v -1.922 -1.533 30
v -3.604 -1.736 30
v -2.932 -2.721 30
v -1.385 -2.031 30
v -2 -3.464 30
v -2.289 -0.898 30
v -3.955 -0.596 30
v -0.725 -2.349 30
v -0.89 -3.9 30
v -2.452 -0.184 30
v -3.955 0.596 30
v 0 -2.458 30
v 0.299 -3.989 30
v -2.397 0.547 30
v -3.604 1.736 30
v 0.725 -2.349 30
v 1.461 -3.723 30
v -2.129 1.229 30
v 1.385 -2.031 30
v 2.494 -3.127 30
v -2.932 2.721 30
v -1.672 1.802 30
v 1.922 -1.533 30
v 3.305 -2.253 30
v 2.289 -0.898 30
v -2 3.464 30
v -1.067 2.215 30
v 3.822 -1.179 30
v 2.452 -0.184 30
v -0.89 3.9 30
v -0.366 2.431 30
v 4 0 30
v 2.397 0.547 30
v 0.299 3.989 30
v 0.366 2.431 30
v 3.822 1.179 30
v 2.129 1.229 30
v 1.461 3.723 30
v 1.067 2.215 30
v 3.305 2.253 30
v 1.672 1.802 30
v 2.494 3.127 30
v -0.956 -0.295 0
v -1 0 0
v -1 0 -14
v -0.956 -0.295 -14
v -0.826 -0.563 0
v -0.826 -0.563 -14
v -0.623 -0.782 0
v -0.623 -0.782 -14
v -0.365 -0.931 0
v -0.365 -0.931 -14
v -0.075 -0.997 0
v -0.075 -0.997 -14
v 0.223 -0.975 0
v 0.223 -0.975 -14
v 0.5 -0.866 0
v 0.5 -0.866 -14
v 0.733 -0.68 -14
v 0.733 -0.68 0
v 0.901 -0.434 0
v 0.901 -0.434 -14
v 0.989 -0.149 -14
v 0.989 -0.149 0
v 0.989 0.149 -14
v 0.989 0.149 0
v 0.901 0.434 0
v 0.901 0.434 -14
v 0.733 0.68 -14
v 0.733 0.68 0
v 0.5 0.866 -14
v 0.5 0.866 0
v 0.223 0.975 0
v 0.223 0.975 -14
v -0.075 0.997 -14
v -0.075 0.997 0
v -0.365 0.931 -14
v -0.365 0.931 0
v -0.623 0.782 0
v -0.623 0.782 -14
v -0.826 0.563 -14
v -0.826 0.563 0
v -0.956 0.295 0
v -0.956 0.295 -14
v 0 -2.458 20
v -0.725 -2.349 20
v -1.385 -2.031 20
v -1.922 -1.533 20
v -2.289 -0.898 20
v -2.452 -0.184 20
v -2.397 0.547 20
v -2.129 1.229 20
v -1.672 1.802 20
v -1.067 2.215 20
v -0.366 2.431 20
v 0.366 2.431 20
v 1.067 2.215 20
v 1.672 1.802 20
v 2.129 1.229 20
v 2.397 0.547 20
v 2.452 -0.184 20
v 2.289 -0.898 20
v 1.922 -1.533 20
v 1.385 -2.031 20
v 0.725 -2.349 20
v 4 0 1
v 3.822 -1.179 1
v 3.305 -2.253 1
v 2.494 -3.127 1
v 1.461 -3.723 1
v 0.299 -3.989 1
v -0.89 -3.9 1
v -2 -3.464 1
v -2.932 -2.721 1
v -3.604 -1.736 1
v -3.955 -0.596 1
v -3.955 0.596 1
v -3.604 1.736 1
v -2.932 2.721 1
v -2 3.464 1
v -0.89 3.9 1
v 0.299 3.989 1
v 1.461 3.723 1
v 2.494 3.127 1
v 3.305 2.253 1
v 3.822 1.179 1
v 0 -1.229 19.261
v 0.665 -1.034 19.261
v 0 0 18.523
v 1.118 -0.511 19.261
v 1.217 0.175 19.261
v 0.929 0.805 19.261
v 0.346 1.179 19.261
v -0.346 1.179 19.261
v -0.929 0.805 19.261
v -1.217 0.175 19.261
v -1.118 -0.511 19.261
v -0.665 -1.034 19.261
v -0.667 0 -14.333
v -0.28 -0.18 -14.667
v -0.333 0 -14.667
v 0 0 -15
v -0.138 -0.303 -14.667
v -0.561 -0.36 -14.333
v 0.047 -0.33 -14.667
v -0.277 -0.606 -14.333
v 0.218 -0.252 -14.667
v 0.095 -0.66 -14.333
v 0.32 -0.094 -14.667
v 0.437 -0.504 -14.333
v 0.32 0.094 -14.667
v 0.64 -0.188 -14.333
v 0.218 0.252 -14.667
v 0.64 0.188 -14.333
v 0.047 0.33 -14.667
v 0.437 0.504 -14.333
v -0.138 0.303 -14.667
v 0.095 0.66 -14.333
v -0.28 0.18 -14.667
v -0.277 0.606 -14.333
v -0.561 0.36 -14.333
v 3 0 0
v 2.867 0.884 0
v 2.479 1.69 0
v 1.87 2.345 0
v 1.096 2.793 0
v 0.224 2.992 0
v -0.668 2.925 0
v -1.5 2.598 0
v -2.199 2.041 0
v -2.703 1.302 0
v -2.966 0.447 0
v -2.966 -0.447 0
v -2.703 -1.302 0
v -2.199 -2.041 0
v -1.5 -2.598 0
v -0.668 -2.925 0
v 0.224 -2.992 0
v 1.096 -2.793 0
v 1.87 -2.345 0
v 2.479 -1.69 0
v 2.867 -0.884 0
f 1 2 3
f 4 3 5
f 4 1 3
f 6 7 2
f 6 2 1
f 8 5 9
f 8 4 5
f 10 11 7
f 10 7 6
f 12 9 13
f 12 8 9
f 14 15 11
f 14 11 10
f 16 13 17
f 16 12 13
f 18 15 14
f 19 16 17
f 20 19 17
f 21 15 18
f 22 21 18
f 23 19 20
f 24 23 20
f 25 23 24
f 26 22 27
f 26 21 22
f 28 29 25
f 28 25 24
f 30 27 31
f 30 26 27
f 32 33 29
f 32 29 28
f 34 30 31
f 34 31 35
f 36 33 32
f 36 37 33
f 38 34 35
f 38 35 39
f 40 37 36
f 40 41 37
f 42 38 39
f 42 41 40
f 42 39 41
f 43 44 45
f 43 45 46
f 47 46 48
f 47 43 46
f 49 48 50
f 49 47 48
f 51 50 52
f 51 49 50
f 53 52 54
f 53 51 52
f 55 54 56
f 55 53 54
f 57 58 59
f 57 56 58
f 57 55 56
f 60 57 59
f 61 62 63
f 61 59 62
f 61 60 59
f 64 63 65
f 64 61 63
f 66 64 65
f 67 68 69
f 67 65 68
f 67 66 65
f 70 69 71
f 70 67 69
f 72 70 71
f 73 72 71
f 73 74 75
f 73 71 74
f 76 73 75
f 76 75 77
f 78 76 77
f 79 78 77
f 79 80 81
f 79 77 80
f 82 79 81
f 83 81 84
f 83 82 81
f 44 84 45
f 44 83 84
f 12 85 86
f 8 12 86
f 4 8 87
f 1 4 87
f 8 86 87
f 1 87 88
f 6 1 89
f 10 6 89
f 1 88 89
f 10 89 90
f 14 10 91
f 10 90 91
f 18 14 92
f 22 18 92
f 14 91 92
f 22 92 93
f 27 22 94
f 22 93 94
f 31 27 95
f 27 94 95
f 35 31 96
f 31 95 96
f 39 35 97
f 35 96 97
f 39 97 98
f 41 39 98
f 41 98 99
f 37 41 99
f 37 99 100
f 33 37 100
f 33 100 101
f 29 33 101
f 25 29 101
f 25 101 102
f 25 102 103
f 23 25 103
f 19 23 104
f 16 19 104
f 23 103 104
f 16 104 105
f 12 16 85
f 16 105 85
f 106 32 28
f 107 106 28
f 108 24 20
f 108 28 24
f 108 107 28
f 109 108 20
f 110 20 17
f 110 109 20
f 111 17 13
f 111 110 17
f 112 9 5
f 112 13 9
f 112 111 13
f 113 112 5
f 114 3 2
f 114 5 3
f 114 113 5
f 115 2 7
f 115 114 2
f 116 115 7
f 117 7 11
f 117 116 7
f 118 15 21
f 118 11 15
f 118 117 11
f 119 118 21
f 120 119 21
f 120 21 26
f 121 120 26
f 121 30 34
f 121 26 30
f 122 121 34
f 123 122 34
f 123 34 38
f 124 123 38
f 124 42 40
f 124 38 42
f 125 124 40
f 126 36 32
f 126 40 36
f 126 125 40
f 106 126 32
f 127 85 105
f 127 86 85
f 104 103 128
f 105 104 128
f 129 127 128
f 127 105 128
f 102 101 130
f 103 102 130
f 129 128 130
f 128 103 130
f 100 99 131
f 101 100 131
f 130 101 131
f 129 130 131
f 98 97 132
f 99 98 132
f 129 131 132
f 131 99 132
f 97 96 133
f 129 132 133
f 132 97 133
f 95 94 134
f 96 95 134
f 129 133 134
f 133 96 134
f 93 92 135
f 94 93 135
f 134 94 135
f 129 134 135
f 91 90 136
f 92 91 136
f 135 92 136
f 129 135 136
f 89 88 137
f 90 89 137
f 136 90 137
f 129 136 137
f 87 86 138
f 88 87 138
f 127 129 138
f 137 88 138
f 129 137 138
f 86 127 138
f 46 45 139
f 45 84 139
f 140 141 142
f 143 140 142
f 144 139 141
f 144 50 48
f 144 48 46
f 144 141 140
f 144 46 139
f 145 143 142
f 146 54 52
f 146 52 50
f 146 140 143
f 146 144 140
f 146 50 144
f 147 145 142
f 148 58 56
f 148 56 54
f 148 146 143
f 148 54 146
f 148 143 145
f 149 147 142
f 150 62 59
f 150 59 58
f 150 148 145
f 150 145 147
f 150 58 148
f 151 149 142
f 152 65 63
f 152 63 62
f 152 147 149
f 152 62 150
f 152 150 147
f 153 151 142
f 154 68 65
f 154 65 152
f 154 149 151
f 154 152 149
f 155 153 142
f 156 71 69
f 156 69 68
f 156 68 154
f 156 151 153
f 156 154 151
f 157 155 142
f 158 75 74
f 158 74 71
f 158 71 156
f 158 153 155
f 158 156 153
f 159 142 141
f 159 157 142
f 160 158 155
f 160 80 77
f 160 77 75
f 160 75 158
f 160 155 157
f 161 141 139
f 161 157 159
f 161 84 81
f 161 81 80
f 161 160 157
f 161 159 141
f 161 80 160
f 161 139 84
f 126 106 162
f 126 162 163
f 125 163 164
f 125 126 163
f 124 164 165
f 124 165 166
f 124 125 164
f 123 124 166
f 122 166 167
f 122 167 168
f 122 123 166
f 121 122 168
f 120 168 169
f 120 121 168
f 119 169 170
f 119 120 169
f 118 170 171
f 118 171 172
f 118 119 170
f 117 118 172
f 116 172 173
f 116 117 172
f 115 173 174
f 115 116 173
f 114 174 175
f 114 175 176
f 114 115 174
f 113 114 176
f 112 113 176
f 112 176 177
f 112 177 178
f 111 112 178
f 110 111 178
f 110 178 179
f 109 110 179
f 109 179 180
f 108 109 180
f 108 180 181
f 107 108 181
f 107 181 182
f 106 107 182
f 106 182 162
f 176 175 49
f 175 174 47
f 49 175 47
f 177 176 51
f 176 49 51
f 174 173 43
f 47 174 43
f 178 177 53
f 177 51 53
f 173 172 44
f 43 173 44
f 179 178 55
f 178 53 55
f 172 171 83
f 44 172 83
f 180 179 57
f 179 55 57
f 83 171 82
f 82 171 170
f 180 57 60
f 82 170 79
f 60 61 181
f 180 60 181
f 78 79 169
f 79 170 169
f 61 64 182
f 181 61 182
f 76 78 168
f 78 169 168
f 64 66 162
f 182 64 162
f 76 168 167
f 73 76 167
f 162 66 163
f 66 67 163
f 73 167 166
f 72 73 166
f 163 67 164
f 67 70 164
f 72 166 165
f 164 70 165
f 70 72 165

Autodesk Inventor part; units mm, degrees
ref_plane "YZ Plane" through (0, 0, 0) normal (1, 0, 0) x (0, 1, 0)
ref_plane "XZ Plane" through (0, 0, 0) normal (0, 1, 0) x (-1, 0, 0)
ref_plane "XY Plane" through (0, 0, 0) normal (0, 0, 1) x (1, 0, 0)
sketch "Sketch1" plane through (0, 0, 0) normal (0, 0, 1) x (1, 0, 0)
  circle A0 centre (0, 0) radius 4
  dimension "d0" = 8
extrude "Extrusion1" add sketch "Sketch1" along normal blind 30
sketch "Sketch2" plane through (0, 0, 0) normal (0, 0, -1) x (-1, 0, 0)
  circle A0 centre (0, 0) radius 1
  dimension "d3" = 2
extrude "Extrusion2" add sketch "Sketch2" along normal blind 15
chamfer "Chamfer1" distance 1 angle 45 1 edges at (1, 0, -15)
chamfer "Chamfer2" distance 1 angle 45 1 edges at (-4, 0, 0)
sketch "Sketch3" plane through (0, 0, 30) normal (0, 0, 1) x (1, 0, 0)
  point P0 (0, 0)
  point P1 (0, 0)
hole "Hole1" at (0, 0, 30) direction (0, 0, -1) diameter 4.917 depth 10 tip angle 118 thread size "M6x1" class "6H" standard "ISO Metric profile"
properties part number "top"
